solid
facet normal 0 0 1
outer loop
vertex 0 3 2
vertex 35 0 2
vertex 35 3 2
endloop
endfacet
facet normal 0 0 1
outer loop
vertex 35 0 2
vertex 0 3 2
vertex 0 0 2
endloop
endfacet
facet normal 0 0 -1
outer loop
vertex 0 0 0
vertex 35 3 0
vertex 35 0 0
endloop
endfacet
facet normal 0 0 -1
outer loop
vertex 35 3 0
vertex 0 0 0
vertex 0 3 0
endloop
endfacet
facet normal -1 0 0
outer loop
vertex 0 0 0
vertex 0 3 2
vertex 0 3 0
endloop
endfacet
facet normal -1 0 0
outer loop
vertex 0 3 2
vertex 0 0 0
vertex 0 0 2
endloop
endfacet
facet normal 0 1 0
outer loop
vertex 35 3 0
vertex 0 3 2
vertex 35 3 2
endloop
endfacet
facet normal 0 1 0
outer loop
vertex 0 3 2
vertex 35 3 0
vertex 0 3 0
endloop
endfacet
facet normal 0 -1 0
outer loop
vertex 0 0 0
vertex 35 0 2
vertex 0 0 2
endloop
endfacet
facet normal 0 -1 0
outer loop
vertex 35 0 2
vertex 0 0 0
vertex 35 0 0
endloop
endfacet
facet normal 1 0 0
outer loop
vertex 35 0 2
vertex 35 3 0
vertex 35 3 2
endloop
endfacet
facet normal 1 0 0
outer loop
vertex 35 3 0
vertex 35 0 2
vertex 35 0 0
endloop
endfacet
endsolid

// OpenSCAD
translate([2.5, 1.5, 1.0]) color([0.5796950107456059, 0.4505631066311552, 0.660245378622389]) cube([5, 3, 2], center=true);
translate([7.5, 1.5, 1.0]) color([0.9962578393535727, 0.9169412179474561, 0.7933250841302242]) cube([5, 3, 2], center=true);
translate([12.5, 1.5, 1.0]) color([0.0823729881966474, 0.6127831050407122, 0.4864442019691668]) cube([5, 3, 2], center=true);
translate([17.5, 1.5, 1.0]) color([0.6301473404114728, 0.8450775756715152, 0.24303562206185625]) cube([5, 3, 2], center=true);
translate([22.5, 1.5, 1.0]) color([0.7314892207908478, 0.11713429320851798, 0.22046053686782852]) cube([5, 3, 2], center=true);
translate([27.5, 1.5, 1.0]) color([0.7945829717105759, 0.33253614921965546, 0.8159130965336595]) cube([5, 3, 2], center=true);
translate([32.5, 1.5, 1.0]) color([0.1006075202160962, 0.14635848891230385, 0.6976706401912388]) cube([5, 3, 2], center=true);
